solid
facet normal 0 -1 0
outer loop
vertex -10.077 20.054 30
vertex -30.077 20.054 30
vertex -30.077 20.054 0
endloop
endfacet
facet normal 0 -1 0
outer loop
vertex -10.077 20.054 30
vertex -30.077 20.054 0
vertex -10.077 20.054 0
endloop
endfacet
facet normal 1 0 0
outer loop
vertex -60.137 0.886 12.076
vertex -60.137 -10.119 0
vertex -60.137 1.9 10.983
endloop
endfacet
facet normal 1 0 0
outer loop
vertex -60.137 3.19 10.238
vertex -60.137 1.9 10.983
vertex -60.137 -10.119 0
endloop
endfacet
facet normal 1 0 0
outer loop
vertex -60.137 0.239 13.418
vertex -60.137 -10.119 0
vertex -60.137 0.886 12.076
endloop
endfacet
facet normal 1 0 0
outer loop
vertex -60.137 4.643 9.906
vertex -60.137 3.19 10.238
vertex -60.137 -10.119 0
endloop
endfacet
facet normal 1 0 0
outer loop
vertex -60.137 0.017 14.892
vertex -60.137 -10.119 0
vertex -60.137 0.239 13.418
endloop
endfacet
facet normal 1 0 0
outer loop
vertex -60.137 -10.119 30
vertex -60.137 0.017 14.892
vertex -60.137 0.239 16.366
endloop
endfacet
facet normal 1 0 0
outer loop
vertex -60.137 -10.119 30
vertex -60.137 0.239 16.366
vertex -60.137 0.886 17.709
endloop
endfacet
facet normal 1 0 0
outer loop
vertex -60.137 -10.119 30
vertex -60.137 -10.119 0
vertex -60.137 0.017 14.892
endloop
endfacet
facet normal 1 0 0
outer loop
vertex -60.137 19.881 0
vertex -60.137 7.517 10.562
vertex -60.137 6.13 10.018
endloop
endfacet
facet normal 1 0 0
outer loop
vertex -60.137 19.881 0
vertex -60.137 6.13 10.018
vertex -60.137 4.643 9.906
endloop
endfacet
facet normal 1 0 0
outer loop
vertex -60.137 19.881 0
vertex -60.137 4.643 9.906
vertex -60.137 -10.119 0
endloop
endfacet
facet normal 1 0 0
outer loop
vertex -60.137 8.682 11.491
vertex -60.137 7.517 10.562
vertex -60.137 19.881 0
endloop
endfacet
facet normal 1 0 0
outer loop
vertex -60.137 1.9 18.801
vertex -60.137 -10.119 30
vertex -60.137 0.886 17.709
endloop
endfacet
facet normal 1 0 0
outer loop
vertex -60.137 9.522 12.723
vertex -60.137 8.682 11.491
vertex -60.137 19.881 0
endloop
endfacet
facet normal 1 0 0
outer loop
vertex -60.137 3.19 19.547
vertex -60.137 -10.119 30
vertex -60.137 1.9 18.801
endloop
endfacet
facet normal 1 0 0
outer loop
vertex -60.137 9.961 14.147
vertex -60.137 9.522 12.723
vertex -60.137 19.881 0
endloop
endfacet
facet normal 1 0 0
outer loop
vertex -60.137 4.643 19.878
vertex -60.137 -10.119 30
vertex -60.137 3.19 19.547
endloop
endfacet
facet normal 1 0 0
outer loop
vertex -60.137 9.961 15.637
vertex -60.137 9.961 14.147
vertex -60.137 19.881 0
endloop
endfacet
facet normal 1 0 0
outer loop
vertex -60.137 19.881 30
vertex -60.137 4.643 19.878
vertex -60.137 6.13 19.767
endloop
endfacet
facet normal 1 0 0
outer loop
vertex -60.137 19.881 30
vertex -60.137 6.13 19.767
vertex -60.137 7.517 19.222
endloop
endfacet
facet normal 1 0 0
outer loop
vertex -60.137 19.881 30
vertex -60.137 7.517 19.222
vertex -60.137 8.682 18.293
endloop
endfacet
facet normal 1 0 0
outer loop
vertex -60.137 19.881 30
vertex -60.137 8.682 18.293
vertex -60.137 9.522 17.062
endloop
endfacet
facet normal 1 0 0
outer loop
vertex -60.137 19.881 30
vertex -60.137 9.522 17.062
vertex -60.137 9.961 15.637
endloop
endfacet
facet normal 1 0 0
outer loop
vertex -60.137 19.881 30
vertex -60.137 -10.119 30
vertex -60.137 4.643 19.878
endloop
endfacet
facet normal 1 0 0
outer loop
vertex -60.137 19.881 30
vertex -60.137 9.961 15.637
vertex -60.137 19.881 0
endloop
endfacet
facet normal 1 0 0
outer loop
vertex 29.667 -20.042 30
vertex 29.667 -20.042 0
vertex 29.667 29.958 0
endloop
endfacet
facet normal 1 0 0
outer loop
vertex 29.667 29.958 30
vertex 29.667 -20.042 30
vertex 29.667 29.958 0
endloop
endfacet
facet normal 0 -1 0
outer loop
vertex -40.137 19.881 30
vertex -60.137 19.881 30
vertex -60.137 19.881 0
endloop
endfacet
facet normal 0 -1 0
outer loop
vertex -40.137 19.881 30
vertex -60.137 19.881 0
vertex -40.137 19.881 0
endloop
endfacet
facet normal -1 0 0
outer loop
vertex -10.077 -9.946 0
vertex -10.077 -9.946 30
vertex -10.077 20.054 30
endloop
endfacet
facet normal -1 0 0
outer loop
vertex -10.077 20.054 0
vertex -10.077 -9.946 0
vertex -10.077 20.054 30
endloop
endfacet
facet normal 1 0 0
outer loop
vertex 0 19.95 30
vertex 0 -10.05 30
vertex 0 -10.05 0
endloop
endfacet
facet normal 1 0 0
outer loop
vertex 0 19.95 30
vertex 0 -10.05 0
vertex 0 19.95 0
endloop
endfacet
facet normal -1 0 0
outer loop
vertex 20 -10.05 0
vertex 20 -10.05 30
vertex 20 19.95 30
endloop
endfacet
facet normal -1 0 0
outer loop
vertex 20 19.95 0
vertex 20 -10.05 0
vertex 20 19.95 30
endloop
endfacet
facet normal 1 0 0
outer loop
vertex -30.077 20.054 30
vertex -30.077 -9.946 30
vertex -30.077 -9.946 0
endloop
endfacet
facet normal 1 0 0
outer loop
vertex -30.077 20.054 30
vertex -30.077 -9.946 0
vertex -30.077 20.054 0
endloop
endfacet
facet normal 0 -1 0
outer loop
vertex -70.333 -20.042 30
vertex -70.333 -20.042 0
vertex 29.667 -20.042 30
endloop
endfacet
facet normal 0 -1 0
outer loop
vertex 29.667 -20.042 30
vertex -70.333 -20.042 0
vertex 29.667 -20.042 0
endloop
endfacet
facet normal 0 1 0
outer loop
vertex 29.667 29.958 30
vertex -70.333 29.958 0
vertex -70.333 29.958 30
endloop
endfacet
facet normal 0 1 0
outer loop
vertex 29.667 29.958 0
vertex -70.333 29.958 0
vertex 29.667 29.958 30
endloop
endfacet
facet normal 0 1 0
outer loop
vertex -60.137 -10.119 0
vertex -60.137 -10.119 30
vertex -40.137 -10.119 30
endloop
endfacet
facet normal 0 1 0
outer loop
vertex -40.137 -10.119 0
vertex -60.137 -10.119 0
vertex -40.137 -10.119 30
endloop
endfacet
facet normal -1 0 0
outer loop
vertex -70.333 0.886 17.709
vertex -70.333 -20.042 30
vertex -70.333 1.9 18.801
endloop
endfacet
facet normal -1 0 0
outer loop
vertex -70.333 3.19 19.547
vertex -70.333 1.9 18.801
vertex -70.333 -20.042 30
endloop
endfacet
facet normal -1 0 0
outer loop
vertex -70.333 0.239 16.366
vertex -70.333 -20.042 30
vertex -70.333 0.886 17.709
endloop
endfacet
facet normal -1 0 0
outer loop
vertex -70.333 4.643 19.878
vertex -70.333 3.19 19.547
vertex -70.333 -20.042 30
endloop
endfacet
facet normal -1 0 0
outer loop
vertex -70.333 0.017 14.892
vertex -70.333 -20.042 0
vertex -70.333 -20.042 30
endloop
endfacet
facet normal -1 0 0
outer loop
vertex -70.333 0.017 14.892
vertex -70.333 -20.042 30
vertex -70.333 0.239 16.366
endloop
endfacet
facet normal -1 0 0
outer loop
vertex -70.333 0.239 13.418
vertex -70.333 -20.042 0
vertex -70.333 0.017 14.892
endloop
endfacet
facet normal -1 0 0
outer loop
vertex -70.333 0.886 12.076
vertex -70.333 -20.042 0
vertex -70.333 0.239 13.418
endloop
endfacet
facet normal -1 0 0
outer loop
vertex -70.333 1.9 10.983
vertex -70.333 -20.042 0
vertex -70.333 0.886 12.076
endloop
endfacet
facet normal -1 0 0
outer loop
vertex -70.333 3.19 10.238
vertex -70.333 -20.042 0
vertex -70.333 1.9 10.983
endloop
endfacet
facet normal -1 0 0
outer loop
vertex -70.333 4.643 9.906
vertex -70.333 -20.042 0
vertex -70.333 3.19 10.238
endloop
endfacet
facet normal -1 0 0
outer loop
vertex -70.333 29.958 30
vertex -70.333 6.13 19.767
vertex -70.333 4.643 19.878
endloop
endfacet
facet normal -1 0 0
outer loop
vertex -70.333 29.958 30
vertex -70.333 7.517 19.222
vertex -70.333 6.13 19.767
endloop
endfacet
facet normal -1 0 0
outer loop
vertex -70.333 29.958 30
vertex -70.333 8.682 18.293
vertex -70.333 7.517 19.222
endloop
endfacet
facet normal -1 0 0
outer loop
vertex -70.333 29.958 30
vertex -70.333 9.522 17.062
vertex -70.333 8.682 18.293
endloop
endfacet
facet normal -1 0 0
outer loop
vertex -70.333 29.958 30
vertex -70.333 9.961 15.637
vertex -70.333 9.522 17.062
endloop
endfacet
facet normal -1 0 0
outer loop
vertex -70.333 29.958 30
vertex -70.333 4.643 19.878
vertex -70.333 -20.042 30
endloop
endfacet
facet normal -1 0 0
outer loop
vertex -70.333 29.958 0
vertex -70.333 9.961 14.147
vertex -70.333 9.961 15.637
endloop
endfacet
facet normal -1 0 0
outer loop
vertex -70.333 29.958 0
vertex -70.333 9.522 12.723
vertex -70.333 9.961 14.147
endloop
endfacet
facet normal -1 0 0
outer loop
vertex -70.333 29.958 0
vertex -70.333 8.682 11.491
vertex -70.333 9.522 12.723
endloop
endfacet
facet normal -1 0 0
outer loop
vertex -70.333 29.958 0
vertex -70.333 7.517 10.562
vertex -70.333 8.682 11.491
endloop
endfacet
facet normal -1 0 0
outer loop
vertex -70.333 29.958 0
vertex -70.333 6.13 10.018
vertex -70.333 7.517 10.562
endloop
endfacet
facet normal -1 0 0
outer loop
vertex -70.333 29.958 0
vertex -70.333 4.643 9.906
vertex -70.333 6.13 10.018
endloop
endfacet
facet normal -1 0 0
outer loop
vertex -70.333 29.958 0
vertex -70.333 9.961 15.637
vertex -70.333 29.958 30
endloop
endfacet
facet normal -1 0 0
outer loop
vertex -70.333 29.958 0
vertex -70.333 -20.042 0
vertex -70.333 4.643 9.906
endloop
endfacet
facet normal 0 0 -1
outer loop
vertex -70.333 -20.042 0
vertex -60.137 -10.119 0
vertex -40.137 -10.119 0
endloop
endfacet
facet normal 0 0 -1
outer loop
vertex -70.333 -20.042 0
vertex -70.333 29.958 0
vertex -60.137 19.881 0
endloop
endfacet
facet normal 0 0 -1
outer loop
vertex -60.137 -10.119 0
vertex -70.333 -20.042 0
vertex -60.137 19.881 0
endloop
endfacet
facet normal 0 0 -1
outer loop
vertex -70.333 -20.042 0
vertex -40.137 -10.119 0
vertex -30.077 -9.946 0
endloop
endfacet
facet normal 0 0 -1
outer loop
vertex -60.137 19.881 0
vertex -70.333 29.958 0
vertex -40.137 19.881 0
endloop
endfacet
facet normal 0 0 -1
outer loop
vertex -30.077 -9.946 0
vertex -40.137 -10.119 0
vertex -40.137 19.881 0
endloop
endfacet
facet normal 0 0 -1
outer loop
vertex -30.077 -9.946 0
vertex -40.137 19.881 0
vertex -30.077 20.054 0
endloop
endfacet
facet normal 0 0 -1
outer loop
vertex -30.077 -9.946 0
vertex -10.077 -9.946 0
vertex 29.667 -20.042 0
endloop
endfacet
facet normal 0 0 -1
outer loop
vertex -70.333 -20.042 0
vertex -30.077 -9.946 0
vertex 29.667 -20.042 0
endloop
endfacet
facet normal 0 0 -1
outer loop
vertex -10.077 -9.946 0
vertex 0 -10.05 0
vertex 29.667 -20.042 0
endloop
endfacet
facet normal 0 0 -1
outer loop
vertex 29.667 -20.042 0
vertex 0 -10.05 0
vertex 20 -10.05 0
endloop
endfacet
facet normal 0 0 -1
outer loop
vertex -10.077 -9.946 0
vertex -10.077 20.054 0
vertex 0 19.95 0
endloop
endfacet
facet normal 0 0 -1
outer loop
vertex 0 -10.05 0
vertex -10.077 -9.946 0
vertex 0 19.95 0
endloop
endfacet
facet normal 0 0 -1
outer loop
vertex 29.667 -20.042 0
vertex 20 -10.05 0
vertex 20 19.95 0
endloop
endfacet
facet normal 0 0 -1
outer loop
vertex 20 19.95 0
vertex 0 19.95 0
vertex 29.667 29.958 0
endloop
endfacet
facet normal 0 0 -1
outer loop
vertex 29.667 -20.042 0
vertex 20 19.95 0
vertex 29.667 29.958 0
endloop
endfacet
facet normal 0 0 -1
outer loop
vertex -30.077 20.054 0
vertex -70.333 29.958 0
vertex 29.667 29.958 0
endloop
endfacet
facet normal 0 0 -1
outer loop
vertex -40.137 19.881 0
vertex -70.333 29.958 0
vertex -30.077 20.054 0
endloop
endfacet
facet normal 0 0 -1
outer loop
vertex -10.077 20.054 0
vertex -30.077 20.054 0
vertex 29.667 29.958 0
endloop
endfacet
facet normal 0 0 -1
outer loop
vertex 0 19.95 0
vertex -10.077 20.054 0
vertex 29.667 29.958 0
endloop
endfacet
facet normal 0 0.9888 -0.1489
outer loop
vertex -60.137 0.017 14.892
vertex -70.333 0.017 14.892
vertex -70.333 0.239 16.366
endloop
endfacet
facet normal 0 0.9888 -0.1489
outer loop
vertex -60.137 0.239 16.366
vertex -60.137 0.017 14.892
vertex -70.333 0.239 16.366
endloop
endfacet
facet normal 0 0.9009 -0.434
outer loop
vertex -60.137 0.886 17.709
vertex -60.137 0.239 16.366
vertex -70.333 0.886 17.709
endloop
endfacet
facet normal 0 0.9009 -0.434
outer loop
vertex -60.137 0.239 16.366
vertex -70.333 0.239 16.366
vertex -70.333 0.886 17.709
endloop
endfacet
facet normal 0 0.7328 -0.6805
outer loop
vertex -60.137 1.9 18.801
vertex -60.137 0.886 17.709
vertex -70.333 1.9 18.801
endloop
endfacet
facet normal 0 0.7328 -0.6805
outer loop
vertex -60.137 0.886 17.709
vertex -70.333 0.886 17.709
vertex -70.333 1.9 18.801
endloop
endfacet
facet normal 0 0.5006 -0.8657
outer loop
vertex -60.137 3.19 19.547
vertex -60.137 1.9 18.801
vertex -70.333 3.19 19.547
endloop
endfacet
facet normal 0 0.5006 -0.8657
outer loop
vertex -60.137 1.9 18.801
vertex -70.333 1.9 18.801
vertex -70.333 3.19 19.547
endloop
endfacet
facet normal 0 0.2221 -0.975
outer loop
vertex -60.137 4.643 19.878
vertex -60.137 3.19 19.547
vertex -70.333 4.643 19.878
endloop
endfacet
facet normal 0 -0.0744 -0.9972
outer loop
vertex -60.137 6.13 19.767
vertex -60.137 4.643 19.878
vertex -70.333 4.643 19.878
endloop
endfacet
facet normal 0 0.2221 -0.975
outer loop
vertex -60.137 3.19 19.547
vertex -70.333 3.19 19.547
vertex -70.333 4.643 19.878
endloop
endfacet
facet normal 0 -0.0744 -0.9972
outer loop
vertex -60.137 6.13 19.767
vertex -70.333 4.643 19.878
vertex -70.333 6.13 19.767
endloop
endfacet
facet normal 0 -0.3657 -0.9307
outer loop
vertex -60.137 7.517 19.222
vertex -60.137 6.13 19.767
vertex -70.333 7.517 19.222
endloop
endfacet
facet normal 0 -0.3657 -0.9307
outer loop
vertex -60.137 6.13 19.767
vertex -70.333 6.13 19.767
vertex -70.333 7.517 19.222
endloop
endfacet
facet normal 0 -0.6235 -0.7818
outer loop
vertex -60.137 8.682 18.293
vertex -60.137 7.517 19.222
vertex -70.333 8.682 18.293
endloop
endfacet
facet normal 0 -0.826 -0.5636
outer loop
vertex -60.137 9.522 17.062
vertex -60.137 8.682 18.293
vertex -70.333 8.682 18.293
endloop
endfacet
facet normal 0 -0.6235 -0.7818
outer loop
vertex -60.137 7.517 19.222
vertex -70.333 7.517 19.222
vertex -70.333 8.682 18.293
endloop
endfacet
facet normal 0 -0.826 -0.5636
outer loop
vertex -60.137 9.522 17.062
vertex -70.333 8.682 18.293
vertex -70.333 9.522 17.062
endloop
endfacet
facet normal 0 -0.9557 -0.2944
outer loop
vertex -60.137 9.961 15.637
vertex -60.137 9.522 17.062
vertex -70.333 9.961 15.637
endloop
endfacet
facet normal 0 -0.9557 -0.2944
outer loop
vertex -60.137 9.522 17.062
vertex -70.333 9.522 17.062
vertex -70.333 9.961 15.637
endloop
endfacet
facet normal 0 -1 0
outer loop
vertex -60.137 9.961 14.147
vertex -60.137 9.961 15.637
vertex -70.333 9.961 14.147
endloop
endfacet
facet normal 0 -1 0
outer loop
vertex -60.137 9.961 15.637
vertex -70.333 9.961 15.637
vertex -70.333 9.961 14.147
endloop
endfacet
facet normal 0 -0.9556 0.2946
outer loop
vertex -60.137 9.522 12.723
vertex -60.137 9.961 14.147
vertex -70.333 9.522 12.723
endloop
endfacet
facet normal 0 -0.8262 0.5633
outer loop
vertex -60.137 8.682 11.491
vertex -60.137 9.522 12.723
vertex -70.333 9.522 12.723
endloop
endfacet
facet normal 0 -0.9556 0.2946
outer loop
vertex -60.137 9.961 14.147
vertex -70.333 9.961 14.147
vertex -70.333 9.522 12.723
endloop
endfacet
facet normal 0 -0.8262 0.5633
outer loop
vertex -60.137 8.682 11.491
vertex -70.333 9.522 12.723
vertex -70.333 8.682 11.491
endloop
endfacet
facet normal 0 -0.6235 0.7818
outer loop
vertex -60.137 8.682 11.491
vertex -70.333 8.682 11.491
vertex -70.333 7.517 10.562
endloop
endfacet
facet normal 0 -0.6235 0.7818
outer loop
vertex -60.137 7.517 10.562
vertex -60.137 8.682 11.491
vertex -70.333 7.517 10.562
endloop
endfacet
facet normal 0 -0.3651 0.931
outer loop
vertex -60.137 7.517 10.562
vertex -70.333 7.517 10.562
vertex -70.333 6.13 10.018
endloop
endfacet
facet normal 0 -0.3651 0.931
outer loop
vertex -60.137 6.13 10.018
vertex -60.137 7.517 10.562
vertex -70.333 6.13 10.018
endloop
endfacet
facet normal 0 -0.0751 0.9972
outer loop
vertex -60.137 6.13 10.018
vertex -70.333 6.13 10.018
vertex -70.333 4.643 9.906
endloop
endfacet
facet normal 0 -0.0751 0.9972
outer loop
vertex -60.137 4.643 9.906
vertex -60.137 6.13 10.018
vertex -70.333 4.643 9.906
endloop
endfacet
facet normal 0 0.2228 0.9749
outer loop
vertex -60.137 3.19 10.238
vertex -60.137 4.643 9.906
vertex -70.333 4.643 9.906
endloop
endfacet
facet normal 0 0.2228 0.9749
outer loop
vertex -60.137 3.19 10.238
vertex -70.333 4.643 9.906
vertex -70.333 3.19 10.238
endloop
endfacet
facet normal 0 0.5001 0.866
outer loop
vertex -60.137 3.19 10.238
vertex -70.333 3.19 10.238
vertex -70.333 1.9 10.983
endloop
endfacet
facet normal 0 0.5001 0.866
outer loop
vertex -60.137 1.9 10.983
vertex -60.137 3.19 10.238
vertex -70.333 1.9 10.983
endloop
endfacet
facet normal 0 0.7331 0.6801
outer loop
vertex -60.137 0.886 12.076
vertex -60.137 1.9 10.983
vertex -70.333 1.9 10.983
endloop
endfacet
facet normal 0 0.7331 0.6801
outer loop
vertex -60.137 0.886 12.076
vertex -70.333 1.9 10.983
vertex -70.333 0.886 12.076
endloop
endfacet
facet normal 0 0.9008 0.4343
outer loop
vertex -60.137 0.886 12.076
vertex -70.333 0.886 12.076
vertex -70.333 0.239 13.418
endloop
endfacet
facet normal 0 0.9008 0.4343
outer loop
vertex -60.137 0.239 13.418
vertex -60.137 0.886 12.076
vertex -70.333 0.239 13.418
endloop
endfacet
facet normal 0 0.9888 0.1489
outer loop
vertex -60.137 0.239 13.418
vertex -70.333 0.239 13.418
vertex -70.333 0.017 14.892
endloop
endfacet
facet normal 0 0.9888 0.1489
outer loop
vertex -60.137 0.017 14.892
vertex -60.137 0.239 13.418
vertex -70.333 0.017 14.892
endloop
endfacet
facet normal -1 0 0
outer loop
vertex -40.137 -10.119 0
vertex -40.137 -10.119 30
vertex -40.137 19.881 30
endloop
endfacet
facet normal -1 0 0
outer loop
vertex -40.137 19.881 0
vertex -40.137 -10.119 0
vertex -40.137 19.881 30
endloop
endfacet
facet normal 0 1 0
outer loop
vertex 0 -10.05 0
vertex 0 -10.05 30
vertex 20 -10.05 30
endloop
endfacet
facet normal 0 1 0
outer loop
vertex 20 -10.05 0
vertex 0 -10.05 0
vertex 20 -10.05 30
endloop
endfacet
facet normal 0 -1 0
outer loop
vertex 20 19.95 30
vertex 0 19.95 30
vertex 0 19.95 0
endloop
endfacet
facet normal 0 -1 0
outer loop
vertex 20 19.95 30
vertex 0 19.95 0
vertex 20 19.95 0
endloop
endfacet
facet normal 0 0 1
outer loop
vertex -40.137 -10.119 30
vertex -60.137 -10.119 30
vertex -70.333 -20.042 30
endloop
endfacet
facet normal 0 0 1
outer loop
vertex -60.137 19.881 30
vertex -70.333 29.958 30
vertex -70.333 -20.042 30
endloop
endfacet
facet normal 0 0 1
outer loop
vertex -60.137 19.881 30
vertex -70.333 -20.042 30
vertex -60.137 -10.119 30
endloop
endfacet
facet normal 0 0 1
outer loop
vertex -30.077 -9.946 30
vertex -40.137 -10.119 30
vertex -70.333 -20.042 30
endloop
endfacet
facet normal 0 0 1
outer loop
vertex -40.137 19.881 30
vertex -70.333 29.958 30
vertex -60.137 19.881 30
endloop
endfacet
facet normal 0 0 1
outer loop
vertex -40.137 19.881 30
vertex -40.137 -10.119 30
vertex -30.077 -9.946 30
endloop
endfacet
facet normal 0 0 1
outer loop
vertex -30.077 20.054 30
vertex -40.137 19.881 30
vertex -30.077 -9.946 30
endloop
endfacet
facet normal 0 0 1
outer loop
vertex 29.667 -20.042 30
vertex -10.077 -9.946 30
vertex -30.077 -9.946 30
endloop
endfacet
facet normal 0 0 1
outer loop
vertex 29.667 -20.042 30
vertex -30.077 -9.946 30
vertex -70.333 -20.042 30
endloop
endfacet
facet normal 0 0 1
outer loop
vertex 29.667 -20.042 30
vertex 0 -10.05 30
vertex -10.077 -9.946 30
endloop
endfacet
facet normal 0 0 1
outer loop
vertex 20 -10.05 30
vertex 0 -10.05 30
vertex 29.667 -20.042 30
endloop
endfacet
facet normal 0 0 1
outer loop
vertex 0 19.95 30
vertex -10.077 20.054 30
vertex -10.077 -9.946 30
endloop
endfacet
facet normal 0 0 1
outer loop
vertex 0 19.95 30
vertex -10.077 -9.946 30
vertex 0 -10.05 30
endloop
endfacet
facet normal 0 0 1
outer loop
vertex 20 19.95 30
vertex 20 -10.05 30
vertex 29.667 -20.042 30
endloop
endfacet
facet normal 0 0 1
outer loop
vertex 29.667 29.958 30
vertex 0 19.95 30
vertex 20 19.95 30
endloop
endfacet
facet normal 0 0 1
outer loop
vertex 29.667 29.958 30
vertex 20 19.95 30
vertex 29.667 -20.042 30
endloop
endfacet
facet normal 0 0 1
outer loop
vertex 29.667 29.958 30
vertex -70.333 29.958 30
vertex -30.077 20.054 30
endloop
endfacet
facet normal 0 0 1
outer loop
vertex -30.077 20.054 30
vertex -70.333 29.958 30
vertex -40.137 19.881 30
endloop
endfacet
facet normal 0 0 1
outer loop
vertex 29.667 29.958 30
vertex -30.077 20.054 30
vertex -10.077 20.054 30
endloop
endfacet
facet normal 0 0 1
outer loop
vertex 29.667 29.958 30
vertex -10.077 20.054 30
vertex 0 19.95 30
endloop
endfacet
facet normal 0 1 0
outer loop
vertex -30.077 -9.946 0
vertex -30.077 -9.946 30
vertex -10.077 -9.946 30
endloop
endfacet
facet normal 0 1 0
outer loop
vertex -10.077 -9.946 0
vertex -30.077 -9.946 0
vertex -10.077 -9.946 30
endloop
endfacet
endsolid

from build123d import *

# Parameters (mm, degrees)
SKETCH_W        = 100
SKETCH_H        = 50
PAD_DEPTH       = 30
SKETCH002_W     = 20
SKETCH002_H     = 30
POCKET_DEPTH    = 30
SKETCH003_W     = 20
SKETCH003_H     = 30
POCKET001_DEPTH = 30
SKETCH004_W     = 20
SKETCH004_H     = 30
POCKET002_DEPTH = 30
SKETCH005_R     = 5
POCKET003_DEPTH = 18


with BuildPart() as part:
    # Sketch → Pad (new body)
    with BuildSketch(Plane.XY):
        with Locations((-20.333326, 4.957771)):
            Rectangle(SKETCH_W, SKETCH_H)
    extrude(amount=PAD_DEPTH)

    # Sketch002 (on Face6 of Pad) → Pocket (cut)
    with BuildSketch(Plane.XY.offset(30)):
        with Locations((-50.136953, 4.881032)):
            Rectangle(SKETCH002_W, SKETCH002_H)
    extrude(amount=-POCKET_DEPTH, mode=Mode.SUBTRACT)

    # Sketch003 (on Face5 of Pocket) → Pocket001 (cut)
    with BuildSketch(Plane.XY.offset(30)):
        with Locations((-20.07695, 5.053894)):
            Rectangle(SKETCH003_W, SKETCH003_H)
    extrude(amount=-POCKET001_DEPTH, mode=Mode.SUBTRACT)

    # Sketch004 (on Face5 of Pocket001) → Pocket002 (cut)
    with BuildSketch(Plane.XY.offset(30)):
        with Locations((10, 4.949642)):
            Rectangle(SKETCH004_W, SKETCH004_H)
    extrude(amount=-POCKET002_DEPTH, mode=Mode.SUBTRACT)

    # Sketch005 (on Face1 of Pocket002) → Pocket003 (cut)
    with BuildSketch(Plane(origin=(-70.333326, 0, 0), x_dir=(0, -1, 0), z_dir=(-1, 0, 0))):
        with Locations((-5.017015, 14.892237)):
            Circle(SKETCH005_R)
    extrude(amount=-POCKET003_DEPTH, mode=Mode.SUBTRACT)


solid = part.part
